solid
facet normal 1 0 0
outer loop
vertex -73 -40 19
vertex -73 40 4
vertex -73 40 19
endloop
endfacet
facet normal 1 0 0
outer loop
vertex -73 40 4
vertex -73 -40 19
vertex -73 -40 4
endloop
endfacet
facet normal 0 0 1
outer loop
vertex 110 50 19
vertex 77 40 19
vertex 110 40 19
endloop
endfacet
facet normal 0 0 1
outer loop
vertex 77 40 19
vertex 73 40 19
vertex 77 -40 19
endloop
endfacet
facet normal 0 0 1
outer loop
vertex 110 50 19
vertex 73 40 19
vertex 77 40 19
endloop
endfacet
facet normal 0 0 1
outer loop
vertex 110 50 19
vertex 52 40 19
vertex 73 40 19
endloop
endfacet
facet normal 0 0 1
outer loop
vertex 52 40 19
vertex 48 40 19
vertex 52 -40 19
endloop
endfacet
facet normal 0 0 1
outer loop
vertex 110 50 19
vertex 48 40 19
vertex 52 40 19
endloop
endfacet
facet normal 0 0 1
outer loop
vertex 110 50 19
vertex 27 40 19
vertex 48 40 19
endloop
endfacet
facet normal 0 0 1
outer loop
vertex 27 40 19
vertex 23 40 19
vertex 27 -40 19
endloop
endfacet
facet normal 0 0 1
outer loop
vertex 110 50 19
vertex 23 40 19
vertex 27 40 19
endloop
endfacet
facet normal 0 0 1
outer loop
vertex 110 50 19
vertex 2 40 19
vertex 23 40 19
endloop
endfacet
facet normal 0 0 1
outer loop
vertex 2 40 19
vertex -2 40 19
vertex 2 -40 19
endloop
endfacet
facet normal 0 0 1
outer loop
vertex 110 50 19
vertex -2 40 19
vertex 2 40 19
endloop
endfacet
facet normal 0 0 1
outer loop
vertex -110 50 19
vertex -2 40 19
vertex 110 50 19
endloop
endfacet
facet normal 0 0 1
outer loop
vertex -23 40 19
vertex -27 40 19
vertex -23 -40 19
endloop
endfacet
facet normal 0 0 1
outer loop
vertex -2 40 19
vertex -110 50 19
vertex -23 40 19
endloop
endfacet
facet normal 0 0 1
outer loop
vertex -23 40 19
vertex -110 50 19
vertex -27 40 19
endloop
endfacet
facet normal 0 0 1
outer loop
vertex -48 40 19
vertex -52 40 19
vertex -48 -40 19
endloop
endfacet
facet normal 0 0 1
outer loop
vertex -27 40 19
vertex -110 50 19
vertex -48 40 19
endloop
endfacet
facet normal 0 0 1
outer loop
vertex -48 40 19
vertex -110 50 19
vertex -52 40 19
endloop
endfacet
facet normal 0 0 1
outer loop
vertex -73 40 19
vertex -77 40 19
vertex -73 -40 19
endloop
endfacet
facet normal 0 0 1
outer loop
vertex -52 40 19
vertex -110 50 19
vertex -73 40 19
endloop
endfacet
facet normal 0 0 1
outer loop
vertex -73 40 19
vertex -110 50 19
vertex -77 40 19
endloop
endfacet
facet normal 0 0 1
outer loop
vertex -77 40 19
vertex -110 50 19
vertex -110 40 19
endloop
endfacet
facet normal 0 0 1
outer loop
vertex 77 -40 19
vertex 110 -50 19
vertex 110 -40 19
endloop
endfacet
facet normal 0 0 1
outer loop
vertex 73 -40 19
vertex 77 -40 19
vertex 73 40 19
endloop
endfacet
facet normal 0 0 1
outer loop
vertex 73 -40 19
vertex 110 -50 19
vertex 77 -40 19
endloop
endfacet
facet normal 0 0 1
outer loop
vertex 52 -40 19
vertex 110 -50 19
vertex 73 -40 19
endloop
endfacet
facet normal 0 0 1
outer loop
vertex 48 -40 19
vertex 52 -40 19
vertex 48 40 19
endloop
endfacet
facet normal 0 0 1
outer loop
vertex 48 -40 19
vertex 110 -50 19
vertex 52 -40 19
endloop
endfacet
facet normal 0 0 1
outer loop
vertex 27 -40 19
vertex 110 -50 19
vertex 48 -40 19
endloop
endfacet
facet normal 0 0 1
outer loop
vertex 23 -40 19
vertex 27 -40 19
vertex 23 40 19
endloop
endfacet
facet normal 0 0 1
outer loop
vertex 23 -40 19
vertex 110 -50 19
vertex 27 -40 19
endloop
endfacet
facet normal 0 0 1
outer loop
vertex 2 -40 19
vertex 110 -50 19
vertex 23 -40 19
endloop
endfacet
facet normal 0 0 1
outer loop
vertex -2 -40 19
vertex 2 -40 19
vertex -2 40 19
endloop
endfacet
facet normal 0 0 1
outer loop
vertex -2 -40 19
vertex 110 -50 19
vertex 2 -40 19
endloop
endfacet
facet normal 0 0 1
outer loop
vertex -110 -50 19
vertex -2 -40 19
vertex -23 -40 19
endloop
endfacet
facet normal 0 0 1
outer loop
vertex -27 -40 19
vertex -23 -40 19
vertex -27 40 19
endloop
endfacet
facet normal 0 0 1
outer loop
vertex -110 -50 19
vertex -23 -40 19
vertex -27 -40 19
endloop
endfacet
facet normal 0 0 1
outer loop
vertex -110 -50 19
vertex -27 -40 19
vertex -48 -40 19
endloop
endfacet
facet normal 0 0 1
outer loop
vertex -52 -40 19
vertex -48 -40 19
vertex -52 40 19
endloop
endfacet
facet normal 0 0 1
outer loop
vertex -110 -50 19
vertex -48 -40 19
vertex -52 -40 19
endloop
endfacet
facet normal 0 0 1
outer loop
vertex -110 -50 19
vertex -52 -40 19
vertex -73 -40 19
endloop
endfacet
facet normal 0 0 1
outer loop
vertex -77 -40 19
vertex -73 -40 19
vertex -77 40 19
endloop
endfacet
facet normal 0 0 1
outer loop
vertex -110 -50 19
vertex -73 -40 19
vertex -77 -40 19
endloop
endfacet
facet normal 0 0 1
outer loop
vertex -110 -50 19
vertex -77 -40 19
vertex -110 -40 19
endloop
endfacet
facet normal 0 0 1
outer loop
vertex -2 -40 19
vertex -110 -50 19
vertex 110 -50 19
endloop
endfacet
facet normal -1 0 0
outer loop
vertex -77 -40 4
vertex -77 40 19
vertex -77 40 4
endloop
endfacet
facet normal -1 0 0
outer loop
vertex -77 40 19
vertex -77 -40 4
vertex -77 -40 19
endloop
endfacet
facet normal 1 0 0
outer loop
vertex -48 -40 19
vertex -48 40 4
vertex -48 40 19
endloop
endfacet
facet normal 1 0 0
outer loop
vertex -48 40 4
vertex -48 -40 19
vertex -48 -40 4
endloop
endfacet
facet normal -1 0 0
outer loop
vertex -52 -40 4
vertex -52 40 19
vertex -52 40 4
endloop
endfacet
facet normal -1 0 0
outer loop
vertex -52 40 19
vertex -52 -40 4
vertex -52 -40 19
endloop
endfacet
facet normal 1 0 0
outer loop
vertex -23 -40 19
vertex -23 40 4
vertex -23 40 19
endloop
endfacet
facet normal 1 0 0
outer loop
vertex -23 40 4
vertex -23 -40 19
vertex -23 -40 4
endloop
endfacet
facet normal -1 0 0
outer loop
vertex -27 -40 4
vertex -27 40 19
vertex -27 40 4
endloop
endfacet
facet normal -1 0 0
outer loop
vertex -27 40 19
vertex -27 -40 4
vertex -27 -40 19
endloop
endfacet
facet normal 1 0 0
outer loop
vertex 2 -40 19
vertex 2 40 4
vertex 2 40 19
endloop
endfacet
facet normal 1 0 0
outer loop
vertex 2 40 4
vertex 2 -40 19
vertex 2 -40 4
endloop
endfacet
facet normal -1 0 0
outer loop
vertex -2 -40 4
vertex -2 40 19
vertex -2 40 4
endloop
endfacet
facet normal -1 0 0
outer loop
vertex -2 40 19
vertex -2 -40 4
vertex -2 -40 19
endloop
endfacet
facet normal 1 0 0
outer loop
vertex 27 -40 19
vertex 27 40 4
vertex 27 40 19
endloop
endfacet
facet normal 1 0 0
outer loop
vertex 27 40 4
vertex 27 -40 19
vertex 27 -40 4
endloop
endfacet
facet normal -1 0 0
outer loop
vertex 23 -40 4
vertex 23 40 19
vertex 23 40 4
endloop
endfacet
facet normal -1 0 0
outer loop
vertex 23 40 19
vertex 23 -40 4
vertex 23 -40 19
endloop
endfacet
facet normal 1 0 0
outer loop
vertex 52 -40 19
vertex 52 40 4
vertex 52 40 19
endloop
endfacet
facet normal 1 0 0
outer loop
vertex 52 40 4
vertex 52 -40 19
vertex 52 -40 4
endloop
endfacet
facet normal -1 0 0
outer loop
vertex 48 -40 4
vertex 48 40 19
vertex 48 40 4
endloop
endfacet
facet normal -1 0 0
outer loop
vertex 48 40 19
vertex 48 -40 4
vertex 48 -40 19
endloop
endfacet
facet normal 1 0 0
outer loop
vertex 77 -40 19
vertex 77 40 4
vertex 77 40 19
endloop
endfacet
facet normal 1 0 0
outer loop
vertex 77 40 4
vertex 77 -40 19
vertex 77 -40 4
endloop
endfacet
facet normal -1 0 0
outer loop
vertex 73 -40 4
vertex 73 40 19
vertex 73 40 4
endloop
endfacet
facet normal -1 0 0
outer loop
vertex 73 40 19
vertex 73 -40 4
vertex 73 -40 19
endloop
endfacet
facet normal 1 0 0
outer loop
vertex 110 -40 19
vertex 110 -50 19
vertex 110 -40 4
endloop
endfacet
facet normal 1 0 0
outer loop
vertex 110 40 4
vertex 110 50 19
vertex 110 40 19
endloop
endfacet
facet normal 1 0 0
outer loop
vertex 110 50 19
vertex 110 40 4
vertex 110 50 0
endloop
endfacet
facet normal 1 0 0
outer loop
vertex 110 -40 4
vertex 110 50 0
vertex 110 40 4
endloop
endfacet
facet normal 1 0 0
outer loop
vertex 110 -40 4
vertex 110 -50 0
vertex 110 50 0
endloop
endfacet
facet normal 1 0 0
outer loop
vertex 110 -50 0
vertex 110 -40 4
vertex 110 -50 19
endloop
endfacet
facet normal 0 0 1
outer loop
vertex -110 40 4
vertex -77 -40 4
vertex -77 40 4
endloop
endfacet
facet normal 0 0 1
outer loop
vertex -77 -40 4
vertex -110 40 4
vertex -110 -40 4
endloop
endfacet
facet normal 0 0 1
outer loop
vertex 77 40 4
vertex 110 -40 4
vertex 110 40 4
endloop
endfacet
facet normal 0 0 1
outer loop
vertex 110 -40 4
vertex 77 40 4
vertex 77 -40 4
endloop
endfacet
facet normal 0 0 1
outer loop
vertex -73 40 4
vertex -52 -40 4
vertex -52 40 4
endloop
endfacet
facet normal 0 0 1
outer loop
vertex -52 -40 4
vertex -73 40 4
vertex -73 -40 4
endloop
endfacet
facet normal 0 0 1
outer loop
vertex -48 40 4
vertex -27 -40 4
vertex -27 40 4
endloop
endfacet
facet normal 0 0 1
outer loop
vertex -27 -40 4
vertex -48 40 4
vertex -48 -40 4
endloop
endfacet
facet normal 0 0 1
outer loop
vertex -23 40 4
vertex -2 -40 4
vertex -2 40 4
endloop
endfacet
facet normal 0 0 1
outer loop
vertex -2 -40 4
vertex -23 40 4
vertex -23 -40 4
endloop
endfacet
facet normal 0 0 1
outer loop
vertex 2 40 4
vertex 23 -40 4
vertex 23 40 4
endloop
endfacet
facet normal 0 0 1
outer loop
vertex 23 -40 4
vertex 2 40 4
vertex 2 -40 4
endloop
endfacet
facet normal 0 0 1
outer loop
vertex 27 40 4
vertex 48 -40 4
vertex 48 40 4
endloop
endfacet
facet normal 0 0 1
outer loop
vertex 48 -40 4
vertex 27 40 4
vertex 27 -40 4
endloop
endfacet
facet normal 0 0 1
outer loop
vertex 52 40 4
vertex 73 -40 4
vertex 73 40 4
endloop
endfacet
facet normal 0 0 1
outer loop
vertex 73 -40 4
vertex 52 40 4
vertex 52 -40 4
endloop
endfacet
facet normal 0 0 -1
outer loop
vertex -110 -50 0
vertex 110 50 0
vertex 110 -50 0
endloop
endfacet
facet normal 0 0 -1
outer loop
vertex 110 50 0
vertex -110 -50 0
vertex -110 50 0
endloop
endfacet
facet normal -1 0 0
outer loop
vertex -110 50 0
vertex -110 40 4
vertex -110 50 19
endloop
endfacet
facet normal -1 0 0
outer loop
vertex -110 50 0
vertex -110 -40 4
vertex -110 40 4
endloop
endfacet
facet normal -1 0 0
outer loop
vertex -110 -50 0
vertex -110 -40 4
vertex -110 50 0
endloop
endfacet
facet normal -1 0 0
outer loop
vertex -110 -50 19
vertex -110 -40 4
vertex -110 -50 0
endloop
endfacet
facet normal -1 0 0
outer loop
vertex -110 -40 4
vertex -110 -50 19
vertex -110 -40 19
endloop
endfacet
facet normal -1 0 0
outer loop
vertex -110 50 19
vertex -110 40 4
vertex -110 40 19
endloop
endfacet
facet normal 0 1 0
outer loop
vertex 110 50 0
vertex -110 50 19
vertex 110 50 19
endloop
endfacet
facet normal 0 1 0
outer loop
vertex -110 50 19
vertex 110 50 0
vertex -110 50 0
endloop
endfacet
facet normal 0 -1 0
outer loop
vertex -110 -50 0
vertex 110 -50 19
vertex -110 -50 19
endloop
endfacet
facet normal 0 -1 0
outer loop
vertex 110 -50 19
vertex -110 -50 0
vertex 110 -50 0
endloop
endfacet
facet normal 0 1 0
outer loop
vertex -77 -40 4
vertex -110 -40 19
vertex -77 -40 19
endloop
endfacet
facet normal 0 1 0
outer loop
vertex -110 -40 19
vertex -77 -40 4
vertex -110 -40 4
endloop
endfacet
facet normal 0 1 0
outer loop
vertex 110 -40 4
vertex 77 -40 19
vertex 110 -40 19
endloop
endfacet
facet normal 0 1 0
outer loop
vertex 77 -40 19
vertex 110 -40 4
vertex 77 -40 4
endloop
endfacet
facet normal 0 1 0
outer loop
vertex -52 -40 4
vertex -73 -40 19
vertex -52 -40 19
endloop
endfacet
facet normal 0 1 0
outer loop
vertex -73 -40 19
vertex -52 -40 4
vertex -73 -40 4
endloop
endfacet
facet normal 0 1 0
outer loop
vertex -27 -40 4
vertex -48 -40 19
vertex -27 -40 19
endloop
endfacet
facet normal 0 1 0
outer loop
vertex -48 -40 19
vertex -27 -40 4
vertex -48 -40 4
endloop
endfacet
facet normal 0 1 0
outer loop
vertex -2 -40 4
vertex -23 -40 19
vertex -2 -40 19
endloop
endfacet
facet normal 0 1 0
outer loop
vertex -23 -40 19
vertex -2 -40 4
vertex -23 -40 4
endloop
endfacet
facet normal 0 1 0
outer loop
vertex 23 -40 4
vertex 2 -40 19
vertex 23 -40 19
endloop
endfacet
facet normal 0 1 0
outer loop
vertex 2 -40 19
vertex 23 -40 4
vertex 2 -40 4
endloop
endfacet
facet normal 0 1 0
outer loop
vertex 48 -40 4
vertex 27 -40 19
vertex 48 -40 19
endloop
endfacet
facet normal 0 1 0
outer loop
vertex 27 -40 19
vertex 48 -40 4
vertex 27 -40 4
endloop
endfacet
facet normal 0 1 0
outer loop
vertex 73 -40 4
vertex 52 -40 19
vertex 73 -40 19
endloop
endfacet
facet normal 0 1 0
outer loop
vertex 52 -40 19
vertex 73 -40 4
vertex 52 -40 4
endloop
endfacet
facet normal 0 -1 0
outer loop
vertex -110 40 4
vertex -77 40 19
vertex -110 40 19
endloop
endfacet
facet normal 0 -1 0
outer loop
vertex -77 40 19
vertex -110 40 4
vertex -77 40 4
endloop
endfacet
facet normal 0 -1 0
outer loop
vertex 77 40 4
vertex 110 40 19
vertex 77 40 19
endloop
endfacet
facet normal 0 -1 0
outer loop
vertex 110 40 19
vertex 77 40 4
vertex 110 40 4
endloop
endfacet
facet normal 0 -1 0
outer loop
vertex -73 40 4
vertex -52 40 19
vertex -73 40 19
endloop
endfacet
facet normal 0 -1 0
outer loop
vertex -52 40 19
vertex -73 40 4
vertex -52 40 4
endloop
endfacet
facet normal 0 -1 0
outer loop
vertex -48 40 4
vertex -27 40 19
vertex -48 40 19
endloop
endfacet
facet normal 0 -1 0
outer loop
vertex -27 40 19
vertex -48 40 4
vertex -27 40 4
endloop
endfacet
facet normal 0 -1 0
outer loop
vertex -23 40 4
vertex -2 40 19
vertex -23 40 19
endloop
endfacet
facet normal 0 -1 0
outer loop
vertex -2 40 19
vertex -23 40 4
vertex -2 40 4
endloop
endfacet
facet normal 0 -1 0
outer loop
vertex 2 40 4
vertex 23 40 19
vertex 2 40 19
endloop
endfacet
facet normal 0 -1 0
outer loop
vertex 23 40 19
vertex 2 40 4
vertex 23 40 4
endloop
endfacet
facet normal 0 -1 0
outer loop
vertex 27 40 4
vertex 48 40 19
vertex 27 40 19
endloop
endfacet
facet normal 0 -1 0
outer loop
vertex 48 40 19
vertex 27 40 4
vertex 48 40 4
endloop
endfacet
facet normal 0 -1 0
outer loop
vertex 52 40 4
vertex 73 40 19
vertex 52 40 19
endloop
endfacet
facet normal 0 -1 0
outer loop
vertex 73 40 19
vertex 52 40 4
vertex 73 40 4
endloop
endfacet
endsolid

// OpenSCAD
$fn = 32;

// ----------------------------------------------------------------------
// Rib frame 220 x 100 x 19
// 7 ribs at 25 mm pitch
// ----------------------------------------------------------------------

// --- parameters (mm) ---
frame = [220, 100, 4];  // base plate size (x, y, z)
rail_w = 10;            // side rail width
ribs = 7;               // number of ribs
rib_t = 4;              // rib thickness
rib_h = 15;             // rib height above the base plate
pitch = 25;             // pitch between rib centres

// --- derived feature positions (mm) ---
span = (ribs - 1) * pitch;          // = 150   distance between the outer ribs
origin_x = -span / 2;               // = -75   X of the first rib
rib_len = frame[1] - 2 * rail_w + 2;  // = 82   rib length, 1 mm into each rail
feature_centers = [
  [origin_x + 0 * pitch, 0],
  [origin_x + 1 * pitch, 0],
  [origin_x + 2 * pitch, 0],
  [origin_x + 3 * pitch, 0],
  [origin_x + 4 * pitch, 0],
  [origin_x + 5 * pitch, 0],
  [origin_x + 6 * pitch, 0]
];   // rib centre line, drives the rib loop

// base plate, two side rails, then the ribs read straight off feature_centers
union() {
  translate([-frame[0] / 2, -frame[1] / 2, 0]) cube(frame);
  translate([-frame[0] / 2, -frame[1] / 2, 0]) cube([frame[0], rail_w, frame[2] + rib_h]);
  translate([-frame[0] / 2, frame[1] / 2 - rail_w, 0]) cube([frame[0], rail_w, frame[2] + rib_h]);
  for (centre = feature_centers)
    translate([centre[0] - rib_t / 2, centre[1] - rib_len / 2, frame[2] - 1])
      cube([rib_t, rib_len, rib_h + 1]);
}
